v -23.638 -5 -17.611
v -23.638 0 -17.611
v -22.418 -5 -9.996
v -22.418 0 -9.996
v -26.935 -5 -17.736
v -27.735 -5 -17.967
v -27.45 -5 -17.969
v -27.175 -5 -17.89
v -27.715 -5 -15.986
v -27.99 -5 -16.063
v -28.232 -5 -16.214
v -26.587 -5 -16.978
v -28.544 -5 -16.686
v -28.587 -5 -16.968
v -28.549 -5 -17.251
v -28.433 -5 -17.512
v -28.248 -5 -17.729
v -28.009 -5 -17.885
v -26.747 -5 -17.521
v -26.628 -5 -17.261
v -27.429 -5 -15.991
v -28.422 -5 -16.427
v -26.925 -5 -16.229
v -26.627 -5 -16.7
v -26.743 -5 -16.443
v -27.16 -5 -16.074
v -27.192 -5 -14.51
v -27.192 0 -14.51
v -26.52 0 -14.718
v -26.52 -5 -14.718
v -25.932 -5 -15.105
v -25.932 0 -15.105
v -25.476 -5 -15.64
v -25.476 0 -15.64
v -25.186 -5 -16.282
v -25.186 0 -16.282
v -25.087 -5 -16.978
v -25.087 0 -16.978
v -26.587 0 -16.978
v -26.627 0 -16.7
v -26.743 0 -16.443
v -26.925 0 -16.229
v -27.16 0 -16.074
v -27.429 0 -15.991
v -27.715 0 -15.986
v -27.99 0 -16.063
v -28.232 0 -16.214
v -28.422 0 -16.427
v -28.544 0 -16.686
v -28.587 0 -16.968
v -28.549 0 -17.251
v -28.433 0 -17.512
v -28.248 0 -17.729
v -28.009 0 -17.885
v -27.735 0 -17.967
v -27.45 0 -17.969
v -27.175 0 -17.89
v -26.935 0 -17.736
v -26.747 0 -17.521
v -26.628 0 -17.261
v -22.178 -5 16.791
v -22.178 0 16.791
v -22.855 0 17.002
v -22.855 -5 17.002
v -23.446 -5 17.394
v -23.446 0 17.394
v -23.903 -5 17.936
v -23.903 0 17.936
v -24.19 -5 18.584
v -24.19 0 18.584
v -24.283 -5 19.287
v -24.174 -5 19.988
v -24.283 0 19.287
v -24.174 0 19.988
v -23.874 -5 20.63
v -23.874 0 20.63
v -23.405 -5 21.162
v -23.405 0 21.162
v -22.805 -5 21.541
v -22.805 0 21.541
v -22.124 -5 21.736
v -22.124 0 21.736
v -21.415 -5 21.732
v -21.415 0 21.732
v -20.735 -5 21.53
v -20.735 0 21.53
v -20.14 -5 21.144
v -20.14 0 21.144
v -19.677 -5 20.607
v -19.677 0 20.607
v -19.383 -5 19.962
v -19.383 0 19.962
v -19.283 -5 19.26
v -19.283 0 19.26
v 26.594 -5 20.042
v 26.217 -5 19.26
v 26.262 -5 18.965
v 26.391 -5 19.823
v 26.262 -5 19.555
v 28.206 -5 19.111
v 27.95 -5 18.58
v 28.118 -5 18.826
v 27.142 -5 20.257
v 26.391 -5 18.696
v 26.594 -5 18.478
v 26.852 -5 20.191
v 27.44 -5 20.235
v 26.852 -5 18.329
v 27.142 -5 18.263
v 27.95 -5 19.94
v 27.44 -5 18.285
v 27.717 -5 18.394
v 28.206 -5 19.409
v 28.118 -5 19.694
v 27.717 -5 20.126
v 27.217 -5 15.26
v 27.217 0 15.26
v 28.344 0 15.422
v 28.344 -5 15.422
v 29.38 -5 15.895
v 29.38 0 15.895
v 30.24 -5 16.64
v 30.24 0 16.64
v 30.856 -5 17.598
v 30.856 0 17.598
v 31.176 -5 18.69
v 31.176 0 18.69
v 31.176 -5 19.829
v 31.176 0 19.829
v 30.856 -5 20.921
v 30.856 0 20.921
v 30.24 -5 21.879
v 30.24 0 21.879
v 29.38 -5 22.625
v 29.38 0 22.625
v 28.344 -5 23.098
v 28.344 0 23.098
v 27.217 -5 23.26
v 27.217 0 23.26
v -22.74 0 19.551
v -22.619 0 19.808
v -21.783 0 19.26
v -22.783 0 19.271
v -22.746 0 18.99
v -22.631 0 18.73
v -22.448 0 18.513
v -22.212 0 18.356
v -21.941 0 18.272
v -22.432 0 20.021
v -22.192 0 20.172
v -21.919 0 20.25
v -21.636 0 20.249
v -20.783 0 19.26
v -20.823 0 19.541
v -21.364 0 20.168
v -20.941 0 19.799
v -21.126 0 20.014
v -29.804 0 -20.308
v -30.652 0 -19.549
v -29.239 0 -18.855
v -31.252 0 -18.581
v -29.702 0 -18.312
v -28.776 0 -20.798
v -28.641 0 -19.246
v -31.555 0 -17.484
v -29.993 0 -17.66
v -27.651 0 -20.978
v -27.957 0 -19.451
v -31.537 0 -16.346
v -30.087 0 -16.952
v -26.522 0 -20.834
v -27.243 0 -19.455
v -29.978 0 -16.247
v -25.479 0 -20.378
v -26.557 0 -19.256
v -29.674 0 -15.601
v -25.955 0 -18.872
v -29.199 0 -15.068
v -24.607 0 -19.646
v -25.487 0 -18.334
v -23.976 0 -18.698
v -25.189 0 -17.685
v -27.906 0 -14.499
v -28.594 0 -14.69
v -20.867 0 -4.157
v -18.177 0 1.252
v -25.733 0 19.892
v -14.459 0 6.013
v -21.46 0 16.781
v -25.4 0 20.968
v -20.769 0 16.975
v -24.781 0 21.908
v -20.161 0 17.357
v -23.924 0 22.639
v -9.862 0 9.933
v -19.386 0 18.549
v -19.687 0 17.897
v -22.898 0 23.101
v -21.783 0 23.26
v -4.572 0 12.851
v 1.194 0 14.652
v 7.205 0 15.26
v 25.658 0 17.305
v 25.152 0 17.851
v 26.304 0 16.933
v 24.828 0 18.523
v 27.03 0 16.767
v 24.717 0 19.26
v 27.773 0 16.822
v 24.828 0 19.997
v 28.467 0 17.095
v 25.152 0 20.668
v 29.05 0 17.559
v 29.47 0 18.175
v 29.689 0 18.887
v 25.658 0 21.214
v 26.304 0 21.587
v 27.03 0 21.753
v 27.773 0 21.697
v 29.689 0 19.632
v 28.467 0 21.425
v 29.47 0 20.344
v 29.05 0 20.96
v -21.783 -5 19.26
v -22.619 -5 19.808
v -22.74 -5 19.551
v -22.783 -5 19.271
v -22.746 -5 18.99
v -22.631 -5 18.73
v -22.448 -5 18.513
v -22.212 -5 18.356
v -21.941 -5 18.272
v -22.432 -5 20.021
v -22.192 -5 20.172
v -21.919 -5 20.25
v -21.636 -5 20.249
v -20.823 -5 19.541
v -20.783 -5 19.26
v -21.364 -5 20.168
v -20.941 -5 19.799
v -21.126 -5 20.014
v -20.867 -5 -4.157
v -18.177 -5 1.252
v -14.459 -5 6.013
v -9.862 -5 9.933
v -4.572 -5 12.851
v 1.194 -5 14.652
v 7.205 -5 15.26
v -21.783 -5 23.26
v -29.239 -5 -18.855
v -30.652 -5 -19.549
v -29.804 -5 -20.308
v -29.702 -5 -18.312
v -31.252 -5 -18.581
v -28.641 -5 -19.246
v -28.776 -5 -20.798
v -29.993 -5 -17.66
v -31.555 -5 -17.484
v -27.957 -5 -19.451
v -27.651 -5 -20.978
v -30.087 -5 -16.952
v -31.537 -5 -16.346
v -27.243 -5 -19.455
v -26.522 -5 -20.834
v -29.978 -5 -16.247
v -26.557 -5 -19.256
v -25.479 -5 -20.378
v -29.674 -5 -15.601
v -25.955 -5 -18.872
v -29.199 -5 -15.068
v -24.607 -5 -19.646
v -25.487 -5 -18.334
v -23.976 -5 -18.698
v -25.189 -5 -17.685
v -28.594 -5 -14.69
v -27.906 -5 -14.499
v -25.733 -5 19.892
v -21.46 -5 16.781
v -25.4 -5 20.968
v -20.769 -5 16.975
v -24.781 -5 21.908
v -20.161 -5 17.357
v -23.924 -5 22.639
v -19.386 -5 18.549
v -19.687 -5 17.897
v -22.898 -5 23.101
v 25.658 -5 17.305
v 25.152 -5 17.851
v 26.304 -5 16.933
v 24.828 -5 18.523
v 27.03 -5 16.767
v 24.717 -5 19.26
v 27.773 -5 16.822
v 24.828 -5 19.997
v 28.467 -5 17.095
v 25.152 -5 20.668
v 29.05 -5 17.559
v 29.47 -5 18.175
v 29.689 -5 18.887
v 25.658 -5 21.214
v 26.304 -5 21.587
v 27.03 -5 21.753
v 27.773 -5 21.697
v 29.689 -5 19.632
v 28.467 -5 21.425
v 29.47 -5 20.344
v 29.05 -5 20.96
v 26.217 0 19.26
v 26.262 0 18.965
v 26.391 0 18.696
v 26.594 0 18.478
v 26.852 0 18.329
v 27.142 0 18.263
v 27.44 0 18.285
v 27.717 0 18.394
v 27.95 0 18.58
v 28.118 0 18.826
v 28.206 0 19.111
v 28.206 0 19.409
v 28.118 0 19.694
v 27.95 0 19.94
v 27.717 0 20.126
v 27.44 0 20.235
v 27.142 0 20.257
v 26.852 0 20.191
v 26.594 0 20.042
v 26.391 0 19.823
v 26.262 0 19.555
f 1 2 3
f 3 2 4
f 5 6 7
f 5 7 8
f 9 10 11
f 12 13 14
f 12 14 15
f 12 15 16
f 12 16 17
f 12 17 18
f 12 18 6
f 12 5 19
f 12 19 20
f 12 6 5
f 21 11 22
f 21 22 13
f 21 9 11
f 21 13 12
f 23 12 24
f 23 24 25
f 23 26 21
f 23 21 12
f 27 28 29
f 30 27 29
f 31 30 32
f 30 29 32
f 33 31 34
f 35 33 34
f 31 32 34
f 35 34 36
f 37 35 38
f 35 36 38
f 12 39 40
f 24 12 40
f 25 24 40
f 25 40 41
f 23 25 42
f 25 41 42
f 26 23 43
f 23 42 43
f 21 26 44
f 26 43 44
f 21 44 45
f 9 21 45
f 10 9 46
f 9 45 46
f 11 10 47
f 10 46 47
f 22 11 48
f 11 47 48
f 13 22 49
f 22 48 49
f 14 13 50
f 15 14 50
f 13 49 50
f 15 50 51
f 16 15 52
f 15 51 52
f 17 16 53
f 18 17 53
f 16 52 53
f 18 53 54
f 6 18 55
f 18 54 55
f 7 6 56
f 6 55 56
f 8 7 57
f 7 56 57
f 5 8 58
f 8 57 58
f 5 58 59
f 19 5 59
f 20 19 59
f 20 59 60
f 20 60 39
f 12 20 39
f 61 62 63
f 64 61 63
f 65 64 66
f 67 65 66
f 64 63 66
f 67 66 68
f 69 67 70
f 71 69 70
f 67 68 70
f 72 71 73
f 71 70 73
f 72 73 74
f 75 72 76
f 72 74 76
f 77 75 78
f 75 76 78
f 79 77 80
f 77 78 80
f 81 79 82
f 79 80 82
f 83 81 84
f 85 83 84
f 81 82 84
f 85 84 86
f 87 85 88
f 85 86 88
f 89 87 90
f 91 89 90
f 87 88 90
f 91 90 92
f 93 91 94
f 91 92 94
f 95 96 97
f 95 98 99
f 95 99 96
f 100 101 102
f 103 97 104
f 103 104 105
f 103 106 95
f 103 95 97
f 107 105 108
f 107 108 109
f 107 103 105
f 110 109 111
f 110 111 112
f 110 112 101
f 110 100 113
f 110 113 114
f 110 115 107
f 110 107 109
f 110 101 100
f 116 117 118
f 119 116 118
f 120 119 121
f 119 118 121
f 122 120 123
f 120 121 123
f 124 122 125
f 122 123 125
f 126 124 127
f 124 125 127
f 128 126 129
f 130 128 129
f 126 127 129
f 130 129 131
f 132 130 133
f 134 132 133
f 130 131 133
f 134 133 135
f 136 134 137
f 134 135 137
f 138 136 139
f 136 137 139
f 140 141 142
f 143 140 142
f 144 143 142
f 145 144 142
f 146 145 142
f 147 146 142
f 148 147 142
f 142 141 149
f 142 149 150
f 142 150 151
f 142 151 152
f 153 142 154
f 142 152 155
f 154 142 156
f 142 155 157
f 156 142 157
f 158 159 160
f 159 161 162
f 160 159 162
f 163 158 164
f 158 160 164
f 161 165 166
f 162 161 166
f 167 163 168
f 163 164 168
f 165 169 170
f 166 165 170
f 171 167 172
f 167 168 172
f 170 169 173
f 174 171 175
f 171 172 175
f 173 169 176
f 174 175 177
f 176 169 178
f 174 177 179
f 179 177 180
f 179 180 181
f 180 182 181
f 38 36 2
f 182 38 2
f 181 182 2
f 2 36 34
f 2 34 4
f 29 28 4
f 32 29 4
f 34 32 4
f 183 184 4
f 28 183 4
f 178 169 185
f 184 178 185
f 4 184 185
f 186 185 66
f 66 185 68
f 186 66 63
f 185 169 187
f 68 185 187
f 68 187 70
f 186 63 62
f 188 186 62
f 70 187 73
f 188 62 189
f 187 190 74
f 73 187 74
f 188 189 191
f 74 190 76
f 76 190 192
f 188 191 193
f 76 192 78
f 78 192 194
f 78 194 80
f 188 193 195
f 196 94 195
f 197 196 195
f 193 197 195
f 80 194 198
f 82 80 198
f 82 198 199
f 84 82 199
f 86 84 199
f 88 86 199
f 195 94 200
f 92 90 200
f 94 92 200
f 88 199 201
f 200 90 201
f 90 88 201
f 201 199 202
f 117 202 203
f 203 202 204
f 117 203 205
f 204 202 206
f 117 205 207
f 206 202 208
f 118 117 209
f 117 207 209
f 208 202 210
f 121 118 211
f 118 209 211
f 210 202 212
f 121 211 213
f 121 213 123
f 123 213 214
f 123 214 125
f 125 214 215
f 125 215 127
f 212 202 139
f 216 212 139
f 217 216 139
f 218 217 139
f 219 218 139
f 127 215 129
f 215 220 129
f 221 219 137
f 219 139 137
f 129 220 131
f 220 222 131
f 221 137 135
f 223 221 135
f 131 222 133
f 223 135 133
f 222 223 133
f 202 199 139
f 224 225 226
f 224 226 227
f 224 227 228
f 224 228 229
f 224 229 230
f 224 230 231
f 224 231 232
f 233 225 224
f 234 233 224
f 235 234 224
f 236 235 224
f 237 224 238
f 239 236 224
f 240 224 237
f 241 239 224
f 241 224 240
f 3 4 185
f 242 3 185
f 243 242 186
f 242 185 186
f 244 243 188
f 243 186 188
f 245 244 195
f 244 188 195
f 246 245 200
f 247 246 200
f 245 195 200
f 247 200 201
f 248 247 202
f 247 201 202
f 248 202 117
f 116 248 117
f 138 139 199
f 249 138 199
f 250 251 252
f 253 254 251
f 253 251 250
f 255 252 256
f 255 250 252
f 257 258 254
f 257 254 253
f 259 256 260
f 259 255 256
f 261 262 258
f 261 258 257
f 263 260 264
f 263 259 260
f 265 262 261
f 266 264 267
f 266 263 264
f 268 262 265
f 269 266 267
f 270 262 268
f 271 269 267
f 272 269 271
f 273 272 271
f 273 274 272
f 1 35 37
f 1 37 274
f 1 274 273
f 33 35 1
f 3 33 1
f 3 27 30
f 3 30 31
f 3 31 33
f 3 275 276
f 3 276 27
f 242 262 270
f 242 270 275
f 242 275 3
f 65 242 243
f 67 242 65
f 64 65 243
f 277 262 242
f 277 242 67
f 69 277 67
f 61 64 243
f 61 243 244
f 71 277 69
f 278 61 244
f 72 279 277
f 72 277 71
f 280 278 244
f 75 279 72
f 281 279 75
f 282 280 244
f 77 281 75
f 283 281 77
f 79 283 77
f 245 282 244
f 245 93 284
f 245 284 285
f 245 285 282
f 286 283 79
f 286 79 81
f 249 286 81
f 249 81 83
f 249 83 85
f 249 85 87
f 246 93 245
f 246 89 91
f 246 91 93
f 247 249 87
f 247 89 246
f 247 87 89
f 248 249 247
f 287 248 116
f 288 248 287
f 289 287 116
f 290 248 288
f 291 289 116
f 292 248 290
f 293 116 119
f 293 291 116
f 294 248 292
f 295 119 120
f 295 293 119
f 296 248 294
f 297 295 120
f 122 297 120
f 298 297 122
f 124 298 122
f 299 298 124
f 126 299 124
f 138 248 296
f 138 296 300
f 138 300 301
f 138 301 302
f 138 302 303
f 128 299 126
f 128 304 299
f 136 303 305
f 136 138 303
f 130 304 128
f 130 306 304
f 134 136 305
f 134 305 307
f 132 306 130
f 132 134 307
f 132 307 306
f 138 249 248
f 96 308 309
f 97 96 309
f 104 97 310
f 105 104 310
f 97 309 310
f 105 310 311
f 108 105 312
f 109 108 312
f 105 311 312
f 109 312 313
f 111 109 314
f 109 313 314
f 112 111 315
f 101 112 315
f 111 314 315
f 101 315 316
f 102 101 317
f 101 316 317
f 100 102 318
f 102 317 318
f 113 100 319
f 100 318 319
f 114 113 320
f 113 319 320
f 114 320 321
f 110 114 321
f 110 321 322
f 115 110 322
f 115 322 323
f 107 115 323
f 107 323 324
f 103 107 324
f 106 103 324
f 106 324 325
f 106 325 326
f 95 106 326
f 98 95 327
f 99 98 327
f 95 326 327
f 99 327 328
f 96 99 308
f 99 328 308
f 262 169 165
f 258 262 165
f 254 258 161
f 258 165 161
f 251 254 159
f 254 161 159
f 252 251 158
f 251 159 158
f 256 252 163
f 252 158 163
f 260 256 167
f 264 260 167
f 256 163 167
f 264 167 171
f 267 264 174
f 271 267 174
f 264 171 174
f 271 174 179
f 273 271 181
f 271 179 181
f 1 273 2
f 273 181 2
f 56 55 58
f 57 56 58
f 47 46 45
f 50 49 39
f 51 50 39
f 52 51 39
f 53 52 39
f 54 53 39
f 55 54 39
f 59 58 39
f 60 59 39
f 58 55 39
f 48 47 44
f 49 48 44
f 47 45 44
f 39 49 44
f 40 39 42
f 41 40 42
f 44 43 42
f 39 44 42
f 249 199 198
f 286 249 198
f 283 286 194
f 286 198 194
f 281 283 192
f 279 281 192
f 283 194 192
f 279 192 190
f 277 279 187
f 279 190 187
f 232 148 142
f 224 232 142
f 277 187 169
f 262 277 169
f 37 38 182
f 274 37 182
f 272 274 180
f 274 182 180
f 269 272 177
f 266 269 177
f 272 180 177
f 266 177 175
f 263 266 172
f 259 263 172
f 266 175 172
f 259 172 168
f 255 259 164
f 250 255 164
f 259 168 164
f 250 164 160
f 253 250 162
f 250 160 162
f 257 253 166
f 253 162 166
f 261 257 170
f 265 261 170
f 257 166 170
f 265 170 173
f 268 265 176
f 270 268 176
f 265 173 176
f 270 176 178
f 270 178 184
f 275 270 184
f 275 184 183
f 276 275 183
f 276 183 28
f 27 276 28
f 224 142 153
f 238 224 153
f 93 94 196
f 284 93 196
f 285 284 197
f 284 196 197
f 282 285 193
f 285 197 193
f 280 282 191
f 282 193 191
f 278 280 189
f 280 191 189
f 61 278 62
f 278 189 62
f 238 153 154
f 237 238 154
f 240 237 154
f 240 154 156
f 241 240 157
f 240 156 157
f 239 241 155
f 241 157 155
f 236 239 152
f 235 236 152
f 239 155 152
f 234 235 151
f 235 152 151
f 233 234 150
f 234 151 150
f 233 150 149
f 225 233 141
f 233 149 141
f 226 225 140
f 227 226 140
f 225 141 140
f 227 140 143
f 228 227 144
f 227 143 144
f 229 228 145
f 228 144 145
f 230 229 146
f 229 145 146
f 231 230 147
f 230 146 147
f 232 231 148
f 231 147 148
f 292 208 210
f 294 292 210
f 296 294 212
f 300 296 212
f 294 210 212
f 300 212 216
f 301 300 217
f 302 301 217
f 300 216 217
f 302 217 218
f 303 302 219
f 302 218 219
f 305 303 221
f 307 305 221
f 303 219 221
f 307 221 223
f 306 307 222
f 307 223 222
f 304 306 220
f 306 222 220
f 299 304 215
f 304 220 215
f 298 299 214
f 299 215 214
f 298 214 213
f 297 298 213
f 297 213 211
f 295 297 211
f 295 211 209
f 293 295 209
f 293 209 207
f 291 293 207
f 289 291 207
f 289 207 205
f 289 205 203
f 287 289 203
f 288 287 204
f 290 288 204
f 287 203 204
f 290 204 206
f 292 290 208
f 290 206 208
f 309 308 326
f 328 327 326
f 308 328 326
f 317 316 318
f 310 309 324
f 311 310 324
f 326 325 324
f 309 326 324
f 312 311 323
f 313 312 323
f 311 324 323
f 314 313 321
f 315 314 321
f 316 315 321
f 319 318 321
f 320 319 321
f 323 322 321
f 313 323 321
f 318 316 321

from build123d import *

# Parameters (mm, degrees)
F1_DEPTH = 5
F2_DEPTH = 5


with BuildPart() as f1:
    # F0 (on Front) → F1 (new body)
    with BuildSketch(Plane.XZ):
        with BuildLine():
            Line((27.217108, 23.25975), (-21.782892, 23.25975))
            ThreePointArc((-21.782892, 23.25975), (-24.378029, 22.303639), (-25.732547, 19.892382))
            Line((-25.732547, 19.892382), (-31.536948, -16.345705))
            ThreePointArc((-31.536948, -16.345705), (-28.219925, -20.927992), (-23.637638, -17.610969))
            Line((-23.637638, -17.610969), (-22.417838, -9.995508))
            ThreePointArc((-22.417838, -9.995508), (-12.258951, 8.088922), (7.204576, 15.25975))
            Line((7.204576, 15.25975), (27.217108, 15.25975))
            ThreePointArc((27.217108, 15.25975), (31.217108, 19.25975), (27.217108, 23.25975))
        make_face()
        with BuildLine():
            ThreePointArc((-25.087293, -16.978337), (-29.489724, -18.600298), (-27.191898, -14.509803))
            ThreePointArc((-27.191898, -14.509803), (-25.684862, -15.356377), (-25.087293, -16.978337))
        make_face(mode=Mode.SUBTRACT)
        with BuildLine():
            ThreePointArc((-22.178287, 16.791215), (-23.404852, 21.162181), (-19.282892, 19.25975))
            ThreePointArc((-19.282892, 19.25975), (-20.160931, 17.357319), (-22.178287, 16.791215))
        make_face(mode=Mode.SUBTRACT)
        with BuildLine():
            ThreePointArc((29.717108, 19.25975), (27.217108, 16.75975), (24.717108, 19.25975))
            ThreePointArc((24.717108, 19.25975), (27.217108, 21.75975), (29.717108, 19.25975))
        make_face(mode=Mode.SUBTRACT)
    extrude(amount=F1_DEPTH)


with BuildPart() as f2:
    # F0 (on Front) → F2 (new body)
    with BuildSketch(Plane.XZ):
        with BuildLine():
            Line((-21.782892, 19.25975), (-20.782892, 19.25975))
            ThreePointArc((-20.782892, 19.25975), (-22.431676, 20.020722), (-21.94105, 18.272336))
            Line((-21.94105, 18.272336), (-21.782892, 19.25975))
        make_face()
        with BuildLine():
            ThreePointArc((28.217108, 19.25975), (27.217108, 20.25975), (26.217108, 19.25975))
            ThreePointArc((26.217108, 19.25975), (27.217108, 18.25975), (28.217108, 19.25975))
        make_face()
        with BuildLine():
            ThreePointArc((-26.587293, -16.978337), (-26.82632, -16.329553), (-27.429135, -15.990923))
            ThreePointArc((-27.429135, -15.990923), (-28.348265, -17.627121), (-26.587293, -16.978337))
        make_face()
    extrude(amount=F2_DEPTH)


solid = Compound([f1.part, f2.part])
